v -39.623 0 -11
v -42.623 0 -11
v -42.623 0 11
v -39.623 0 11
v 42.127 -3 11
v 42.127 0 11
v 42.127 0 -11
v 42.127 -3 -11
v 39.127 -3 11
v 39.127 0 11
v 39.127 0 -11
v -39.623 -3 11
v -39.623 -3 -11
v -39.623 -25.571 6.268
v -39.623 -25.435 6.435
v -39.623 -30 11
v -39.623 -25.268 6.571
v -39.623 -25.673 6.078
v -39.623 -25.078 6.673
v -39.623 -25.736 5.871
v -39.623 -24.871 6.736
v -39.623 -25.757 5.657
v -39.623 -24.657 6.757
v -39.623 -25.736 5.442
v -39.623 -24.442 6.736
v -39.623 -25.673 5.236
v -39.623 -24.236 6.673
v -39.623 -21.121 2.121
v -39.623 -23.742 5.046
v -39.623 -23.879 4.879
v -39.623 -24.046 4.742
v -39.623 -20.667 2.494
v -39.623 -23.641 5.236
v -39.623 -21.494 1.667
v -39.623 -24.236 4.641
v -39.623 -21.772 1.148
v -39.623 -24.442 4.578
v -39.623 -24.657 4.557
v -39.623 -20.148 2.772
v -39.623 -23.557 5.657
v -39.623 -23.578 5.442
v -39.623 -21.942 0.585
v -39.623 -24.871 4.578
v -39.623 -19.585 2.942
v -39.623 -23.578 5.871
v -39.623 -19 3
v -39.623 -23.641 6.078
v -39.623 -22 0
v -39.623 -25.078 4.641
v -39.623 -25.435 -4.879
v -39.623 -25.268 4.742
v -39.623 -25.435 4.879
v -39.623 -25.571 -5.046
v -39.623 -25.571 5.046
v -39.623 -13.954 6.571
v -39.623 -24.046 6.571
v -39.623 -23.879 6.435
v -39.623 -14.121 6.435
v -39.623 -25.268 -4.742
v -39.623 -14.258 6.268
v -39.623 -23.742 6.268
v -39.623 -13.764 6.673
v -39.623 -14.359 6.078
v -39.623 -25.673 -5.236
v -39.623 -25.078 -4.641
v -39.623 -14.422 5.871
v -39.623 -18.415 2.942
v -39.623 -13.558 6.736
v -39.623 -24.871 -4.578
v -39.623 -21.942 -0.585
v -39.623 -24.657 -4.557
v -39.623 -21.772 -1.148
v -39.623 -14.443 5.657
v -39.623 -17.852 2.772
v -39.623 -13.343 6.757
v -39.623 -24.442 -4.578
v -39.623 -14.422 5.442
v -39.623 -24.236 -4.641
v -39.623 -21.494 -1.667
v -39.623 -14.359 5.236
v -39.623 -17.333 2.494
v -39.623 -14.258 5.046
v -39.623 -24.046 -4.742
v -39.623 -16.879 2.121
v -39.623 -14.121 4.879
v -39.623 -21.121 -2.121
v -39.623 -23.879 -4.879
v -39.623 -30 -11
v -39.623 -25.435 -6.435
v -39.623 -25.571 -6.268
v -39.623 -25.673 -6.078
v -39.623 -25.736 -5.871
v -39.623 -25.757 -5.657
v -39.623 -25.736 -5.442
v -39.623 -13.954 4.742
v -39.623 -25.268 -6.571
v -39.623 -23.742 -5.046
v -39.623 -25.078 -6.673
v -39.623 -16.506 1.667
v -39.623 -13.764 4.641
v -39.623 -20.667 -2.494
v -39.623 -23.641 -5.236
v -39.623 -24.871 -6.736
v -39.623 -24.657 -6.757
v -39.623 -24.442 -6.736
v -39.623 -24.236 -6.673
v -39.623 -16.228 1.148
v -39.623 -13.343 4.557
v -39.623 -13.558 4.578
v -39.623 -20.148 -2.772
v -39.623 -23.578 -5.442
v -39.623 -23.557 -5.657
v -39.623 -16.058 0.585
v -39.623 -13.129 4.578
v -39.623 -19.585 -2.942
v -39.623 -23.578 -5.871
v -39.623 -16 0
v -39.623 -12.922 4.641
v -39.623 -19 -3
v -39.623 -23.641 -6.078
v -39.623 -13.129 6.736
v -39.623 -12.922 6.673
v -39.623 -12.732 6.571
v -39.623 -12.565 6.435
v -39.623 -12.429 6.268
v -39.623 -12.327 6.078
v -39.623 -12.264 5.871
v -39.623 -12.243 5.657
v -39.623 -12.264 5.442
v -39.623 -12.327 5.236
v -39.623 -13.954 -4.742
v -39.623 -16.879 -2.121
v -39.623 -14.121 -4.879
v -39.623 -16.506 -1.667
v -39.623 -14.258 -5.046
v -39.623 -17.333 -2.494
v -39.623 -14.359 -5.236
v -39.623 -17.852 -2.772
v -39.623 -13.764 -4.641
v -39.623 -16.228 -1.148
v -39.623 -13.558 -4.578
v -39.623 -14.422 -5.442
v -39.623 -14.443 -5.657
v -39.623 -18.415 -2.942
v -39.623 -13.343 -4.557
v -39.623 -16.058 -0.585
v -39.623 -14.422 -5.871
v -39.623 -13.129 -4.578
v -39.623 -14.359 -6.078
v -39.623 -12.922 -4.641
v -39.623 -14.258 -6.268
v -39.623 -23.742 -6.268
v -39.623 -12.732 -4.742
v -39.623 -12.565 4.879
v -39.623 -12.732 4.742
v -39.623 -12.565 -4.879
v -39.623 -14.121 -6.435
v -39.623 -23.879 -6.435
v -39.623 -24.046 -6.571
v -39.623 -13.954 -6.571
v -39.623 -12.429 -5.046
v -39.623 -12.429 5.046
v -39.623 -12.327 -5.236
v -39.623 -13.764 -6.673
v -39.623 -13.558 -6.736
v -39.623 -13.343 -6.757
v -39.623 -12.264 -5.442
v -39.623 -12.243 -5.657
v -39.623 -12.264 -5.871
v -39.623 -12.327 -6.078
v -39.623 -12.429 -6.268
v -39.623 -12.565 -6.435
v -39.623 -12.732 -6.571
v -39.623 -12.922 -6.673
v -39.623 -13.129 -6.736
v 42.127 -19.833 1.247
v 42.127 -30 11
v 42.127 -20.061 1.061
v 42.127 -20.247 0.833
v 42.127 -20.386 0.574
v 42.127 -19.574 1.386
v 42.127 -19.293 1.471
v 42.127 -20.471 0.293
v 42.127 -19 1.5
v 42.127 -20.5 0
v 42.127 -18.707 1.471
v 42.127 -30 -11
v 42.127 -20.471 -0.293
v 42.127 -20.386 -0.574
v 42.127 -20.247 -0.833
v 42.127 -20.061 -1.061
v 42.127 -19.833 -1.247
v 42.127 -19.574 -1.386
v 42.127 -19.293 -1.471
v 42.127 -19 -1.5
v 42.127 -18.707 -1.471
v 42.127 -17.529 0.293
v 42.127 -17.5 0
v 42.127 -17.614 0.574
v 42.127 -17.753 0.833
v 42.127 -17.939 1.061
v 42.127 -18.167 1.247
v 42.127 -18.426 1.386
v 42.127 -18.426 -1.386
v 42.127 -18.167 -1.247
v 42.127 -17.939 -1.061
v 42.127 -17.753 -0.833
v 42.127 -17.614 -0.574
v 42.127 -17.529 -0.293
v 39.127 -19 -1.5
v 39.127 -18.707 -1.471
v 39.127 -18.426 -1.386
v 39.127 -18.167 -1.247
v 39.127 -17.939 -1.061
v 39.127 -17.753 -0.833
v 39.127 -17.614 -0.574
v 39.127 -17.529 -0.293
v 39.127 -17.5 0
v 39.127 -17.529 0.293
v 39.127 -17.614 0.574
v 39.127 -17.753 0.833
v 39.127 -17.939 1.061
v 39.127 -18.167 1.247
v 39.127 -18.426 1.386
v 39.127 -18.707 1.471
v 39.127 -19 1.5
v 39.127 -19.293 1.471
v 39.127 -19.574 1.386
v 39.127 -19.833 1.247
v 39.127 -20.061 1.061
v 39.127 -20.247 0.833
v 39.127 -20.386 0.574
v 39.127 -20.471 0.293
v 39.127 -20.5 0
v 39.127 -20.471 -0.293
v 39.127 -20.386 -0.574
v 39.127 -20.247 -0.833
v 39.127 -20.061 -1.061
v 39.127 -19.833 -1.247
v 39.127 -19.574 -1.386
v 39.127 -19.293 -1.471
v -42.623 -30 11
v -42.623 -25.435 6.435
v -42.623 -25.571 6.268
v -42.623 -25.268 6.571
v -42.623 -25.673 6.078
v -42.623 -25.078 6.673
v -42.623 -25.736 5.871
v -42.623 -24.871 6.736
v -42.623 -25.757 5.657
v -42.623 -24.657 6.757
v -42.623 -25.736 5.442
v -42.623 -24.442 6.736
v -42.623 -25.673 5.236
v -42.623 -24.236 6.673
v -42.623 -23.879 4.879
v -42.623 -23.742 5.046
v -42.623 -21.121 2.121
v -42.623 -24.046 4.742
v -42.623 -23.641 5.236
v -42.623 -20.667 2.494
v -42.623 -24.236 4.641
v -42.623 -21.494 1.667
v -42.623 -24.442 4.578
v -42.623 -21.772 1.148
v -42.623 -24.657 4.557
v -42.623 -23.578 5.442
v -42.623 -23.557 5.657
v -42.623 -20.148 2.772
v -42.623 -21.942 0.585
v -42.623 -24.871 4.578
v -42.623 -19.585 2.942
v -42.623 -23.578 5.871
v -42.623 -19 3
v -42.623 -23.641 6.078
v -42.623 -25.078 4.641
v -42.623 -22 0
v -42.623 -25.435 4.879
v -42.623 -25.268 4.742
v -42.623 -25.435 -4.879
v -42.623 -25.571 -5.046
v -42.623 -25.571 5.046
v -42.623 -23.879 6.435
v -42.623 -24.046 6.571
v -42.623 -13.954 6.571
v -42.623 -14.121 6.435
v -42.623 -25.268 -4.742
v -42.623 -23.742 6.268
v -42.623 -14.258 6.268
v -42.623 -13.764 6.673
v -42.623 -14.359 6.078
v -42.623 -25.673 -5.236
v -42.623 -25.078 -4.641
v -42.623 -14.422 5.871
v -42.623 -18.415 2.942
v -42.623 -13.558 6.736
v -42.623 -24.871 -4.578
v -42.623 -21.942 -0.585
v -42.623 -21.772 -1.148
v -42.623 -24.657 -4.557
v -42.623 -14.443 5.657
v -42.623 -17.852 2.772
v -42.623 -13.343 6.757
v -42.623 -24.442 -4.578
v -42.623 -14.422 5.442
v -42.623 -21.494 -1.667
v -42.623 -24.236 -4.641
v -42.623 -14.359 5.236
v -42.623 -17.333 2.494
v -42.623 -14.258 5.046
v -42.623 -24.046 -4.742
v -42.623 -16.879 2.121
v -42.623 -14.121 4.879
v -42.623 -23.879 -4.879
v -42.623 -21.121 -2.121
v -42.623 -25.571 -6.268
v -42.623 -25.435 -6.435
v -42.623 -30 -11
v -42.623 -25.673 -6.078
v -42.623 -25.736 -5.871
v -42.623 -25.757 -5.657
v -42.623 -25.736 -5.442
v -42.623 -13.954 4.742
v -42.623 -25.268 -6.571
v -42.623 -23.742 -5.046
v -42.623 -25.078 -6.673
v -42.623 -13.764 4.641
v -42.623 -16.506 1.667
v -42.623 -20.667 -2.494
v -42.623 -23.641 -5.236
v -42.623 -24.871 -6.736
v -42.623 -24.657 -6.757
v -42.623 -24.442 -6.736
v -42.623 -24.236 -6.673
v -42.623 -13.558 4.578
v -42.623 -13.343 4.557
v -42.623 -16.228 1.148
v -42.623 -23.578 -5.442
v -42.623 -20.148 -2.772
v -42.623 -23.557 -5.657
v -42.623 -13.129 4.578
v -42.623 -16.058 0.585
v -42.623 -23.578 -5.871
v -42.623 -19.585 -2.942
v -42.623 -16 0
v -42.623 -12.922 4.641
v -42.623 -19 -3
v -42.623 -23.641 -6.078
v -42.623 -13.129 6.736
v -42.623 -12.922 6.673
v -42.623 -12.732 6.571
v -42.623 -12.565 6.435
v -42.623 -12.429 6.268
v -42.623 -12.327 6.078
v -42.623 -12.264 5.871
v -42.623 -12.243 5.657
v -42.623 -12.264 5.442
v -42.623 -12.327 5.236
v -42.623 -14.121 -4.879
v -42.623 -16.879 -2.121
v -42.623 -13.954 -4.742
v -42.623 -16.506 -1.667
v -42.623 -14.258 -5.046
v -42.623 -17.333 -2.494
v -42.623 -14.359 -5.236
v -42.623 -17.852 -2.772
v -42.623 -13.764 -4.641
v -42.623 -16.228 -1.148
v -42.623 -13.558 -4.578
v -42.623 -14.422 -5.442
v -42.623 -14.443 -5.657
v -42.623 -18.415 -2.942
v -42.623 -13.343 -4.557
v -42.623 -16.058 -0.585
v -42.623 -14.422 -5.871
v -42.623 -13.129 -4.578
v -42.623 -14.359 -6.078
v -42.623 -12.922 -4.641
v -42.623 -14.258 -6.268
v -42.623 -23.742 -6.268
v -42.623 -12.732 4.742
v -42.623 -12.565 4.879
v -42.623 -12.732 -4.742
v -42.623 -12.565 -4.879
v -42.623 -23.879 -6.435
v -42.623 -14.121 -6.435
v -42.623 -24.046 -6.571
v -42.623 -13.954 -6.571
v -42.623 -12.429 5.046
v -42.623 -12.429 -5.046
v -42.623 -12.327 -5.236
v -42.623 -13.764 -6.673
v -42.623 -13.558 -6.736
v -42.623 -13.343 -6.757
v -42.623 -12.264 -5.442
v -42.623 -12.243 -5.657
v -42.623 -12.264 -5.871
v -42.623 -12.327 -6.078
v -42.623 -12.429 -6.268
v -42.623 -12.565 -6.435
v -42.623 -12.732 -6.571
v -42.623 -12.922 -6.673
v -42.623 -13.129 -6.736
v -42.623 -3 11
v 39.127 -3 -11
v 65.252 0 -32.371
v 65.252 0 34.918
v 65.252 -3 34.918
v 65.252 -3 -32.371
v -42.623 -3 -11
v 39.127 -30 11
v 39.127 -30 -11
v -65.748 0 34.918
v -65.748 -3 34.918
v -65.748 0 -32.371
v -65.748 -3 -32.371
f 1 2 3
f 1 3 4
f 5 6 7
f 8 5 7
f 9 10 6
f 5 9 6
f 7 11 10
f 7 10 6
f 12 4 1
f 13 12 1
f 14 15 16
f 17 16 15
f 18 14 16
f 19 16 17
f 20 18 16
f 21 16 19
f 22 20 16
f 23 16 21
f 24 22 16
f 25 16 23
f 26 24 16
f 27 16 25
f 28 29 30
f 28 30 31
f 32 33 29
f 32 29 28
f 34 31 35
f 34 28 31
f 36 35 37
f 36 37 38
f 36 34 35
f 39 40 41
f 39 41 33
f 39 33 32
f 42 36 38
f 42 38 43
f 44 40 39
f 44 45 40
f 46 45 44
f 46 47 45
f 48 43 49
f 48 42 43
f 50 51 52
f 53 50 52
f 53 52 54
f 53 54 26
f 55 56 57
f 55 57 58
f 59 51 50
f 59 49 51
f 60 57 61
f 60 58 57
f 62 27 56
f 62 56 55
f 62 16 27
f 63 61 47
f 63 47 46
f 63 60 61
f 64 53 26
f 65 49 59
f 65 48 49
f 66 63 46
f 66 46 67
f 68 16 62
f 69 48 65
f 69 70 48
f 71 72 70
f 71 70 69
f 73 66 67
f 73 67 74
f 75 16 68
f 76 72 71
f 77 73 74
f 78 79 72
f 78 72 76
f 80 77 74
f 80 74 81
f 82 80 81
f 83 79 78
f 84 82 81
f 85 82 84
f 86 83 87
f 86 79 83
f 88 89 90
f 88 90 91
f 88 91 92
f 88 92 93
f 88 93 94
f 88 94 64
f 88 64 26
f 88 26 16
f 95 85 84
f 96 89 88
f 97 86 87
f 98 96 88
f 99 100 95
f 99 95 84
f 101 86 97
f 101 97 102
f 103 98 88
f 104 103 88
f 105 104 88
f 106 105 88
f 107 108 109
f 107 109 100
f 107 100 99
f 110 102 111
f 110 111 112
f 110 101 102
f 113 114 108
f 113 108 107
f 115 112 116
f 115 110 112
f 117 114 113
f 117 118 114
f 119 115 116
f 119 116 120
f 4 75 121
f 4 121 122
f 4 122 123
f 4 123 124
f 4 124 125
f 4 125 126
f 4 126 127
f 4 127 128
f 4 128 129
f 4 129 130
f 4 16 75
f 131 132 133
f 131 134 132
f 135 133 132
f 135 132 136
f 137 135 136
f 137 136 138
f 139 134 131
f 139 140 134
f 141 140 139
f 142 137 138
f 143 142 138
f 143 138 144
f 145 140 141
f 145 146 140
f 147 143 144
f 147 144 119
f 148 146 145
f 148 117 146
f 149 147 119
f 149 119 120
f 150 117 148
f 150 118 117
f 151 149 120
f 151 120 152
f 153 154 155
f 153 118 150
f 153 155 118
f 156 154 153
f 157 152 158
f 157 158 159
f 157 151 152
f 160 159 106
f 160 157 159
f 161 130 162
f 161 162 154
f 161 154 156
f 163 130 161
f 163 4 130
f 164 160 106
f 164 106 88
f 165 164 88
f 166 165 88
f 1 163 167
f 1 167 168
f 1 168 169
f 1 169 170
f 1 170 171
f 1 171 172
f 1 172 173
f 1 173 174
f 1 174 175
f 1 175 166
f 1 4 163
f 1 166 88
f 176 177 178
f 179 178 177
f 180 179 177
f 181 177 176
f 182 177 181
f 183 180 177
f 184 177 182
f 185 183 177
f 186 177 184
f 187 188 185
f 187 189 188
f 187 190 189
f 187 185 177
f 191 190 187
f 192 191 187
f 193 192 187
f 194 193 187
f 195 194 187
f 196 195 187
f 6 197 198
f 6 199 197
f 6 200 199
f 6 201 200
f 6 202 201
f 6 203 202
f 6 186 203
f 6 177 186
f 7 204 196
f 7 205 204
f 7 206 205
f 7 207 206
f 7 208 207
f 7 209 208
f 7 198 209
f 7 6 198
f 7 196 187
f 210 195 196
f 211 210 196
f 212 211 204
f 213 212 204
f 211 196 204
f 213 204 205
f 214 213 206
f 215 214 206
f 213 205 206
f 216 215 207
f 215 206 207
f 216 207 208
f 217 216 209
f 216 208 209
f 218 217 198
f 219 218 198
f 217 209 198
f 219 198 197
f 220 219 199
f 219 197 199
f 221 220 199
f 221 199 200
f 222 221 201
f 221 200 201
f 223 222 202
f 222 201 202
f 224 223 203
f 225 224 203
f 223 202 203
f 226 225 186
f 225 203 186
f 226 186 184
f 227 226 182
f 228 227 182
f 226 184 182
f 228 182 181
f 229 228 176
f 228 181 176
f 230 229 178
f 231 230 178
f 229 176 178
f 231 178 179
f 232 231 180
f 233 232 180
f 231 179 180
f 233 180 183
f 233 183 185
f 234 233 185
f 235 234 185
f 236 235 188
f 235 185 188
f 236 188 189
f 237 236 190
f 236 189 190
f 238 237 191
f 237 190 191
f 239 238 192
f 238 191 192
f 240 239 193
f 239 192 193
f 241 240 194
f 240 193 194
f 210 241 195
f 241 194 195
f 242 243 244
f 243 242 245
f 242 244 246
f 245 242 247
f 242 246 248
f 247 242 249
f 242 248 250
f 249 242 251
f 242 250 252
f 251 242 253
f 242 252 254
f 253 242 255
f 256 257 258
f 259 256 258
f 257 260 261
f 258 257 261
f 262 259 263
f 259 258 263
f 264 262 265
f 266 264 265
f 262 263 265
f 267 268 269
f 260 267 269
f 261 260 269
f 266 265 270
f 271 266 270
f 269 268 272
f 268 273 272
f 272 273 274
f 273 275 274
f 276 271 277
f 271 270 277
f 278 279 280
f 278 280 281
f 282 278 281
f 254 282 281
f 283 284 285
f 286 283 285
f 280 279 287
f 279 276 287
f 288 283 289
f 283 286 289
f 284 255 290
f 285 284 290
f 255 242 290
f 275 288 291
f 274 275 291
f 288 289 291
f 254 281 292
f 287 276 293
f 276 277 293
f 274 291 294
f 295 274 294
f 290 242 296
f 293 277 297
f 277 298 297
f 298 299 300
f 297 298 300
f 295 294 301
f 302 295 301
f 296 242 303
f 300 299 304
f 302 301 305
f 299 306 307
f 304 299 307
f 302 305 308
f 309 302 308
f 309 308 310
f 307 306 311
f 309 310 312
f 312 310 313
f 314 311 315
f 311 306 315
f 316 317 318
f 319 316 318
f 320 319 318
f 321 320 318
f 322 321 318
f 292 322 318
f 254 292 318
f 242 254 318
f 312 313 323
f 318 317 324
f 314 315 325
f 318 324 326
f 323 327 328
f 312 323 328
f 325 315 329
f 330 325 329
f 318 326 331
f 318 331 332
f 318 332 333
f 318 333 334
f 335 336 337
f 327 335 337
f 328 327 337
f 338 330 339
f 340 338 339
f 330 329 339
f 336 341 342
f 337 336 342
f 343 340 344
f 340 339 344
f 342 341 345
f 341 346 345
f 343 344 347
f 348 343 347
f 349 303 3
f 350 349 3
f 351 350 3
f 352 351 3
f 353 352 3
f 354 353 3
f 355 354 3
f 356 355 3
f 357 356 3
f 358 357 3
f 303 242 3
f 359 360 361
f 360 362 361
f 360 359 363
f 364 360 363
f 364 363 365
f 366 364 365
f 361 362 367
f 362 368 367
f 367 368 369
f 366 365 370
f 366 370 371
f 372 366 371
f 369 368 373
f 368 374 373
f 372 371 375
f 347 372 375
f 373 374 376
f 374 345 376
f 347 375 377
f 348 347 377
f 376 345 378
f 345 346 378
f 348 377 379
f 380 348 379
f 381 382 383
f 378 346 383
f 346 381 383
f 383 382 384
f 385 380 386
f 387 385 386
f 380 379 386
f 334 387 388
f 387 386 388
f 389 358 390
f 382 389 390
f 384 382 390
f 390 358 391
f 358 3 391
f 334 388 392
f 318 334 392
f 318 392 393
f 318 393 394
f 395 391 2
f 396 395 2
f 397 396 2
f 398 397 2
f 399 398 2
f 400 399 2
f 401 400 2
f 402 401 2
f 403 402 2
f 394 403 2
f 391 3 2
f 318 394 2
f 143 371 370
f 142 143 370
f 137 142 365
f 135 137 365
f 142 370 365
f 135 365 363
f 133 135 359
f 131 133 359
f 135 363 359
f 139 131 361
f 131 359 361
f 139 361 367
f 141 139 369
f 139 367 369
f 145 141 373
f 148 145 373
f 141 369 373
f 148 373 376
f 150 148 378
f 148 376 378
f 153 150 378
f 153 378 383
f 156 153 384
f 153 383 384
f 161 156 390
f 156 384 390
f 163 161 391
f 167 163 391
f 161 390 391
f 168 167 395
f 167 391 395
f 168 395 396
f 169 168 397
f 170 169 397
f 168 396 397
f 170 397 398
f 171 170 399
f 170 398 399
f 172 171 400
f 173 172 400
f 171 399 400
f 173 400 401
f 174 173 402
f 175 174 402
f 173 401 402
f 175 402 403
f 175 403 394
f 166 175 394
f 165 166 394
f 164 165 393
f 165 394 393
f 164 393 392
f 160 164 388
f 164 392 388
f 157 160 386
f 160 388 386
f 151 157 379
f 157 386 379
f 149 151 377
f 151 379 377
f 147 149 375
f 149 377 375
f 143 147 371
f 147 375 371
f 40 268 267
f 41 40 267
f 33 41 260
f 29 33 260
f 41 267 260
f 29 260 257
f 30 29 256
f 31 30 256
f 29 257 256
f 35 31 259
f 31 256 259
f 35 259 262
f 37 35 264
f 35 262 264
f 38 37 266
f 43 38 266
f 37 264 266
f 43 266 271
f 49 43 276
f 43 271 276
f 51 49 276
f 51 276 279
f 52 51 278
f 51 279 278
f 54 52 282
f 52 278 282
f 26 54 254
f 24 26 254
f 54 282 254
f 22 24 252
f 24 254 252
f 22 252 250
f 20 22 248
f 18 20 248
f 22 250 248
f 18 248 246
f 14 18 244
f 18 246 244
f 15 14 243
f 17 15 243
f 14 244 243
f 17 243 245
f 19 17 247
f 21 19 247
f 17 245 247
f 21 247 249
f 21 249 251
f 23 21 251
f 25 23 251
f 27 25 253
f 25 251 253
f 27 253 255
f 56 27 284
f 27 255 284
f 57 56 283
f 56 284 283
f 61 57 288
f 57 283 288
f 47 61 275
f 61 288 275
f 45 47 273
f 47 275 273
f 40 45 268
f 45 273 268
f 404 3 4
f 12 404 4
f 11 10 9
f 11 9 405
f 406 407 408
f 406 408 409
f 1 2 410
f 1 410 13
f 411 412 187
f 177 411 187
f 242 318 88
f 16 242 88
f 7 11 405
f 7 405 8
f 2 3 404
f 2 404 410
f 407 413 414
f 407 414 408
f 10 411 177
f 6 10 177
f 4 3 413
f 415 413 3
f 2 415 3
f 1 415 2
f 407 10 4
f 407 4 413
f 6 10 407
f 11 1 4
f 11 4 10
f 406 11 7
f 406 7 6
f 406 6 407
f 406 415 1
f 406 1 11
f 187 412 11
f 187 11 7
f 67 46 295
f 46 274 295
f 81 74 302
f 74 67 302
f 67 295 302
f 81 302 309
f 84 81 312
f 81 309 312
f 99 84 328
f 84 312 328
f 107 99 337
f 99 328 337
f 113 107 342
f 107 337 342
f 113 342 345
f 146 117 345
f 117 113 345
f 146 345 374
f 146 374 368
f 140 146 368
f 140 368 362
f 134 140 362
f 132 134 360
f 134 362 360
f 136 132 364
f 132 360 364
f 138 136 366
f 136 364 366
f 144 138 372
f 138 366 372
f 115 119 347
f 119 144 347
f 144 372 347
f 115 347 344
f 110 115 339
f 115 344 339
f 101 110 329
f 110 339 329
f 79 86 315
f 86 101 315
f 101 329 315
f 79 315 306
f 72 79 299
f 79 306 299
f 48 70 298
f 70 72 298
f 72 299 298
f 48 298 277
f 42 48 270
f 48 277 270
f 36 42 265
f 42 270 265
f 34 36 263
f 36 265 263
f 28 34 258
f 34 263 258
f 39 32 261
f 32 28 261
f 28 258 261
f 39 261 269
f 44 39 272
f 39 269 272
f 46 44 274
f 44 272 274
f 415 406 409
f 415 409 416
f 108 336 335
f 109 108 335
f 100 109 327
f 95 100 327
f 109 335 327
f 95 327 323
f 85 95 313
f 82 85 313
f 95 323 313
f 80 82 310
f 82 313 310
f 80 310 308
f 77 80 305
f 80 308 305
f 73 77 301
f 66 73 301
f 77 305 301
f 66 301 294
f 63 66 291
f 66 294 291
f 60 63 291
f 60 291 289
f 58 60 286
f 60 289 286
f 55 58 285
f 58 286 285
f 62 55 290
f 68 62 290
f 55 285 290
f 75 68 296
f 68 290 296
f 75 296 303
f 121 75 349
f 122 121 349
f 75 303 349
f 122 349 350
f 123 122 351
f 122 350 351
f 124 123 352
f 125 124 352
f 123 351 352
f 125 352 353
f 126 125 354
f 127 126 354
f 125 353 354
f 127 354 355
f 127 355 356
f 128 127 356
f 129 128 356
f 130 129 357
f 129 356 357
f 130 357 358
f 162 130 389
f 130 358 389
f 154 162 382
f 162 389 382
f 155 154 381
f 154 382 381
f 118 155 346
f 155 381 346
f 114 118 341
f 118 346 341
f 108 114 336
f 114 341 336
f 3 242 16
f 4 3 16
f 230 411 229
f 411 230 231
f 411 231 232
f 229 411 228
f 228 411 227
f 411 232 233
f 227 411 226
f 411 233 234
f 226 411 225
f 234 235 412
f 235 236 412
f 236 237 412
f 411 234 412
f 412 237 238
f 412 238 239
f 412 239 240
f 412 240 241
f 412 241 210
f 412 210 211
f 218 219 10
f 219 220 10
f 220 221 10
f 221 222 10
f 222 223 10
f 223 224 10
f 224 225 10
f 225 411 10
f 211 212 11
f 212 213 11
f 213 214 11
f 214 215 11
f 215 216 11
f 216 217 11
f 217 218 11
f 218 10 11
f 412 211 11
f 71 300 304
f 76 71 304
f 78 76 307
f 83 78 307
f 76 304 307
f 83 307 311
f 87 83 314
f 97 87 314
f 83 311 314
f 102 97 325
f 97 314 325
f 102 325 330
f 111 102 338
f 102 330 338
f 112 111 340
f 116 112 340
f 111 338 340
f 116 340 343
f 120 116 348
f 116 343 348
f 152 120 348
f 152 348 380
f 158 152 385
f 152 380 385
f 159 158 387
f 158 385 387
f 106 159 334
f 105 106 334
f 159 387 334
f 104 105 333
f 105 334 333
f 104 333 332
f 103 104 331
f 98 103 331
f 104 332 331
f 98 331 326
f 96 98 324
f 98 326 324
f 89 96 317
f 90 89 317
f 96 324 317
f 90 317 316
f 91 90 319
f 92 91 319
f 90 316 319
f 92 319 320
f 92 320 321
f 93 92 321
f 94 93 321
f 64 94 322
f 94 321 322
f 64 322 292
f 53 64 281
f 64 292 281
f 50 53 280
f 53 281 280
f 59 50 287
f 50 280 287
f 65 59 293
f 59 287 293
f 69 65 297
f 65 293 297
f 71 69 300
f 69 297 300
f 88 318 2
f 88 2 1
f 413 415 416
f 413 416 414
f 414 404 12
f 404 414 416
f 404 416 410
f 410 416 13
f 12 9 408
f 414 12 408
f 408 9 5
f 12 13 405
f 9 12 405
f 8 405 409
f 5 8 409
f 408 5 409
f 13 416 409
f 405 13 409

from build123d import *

# Parameters (mm, degrees)
SKETCH1_W             = 3
SKETCH1_H             = 22
BOSS_EXTRUDE1_DEPTH   = 3
SKETCH1_3_W           = 3
SKETCH1_3_H           = 22
BOSS_EXTRUDE2_DEPTH   = 30
BOSS_EXTRUDE2_2_DEPTH = 30
SKETCH2_R             = 3
SKETCH2_R_2           = 1.1
CUT_EXTRUDE1_DEPTH    = 3
SKETCH3_R             = 1.5
CUT_EXTRUDE2_DEPTH    = 3
CIRPATTERN1_COUNT     = 4


with BuildPart() as part:
    # Sketch1 → Boss-Extrude1 (new body)
    with BuildSketch(Plane(origin=(0, 0, 0), x_dir=(1, 0, 0), z_dir=(0, 1, 0))):
        Polygon((-65.748381877, 32.370550162), (-65.748381877, 19.870550162), (-65.748381877, -22.417679095), (-65.748381877, -34.917679095), (65.251618123, -34.917679095), (65.251618123, -22.417679095), (65.251618123, 17.582320905), (65.251618123, 32.370550162), align=None)
        with Locations((-41.123381877, 0)):
            Rectangle(SKETCH1_W, SKETCH1_H, mode=Mode.SUBTRACT)
        with Locations((40.626618123, 0)):
            Rectangle(SKETCH1_W, SKETCH1_H, mode=Mode.SUBTRACT)
    extrude(amount=-BOSS_EXTRUDE1_DEPTH)


with BuildPart() as body_2:
    # Sketch1<3> → Boss-Extrude2 (new body)
    with BuildSketch(Plane(origin=(0, 0, 0), x_dir=(1, 0, 0), z_dir=(0, 1, 0))):
        with Locations((-41.123381877, 0)):
            Rectangle(SKETCH1_3_W, SKETCH1_3_H)
    extrude(amount=-BOSS_EXTRUDE2_DEPTH)

    # Sketch2 → Cut-Extrude1 (cut)
    with BuildSketch(Plane.ZY.offset(42.623381877)):
        with Locations((0, -19)):
            Circle(SKETCH2_R)
        with Locations((-5.656854249, -24.656854249)):
            Circle(SKETCH2_R_2)
    cut_extrude1 = extrude(amount=-CUT_EXTRUDE1_DEPTH, mode=Mode.SUBTRACT)

    # CirPattern1: Cut-Extrude1 ×4 about axis
    cirpattern1_axis = Axis((0, -19, 0), (1, 0, 0))
    for i in range(1, CIRPATTERN1_COUNT):
        add(cut_extrude1.rotate(cirpattern1_axis, i * 360 / CIRPATTERN1_COUNT), mode=Mode.SUBTRACT)


with BuildPart() as body_3:
    # Sketch1<3> → Boss-Extrude2 2 (new body)
    with BuildSketch(Plane(origin=(0, 0, 0), x_dir=(1, 0, 0), z_dir=(0, 1, 0))):
        with Locations((40.626618123, 0)):
            Rectangle(SKETCH1_3_W, SKETCH1_3_H)
    extrude(amount=-BOSS_EXTRUDE2_2_DEPTH)

    # Sketch3 → Cut-Extrude2 (cut)
    with BuildSketch(Plane(origin=(42.126618123, 0, 0), x_dir=(0, 0, -1), z_dir=(1, 0, 0))):
        with Locations((0, -19)):
            Circle(SKETCH3_R)
    extrude(amount=-CUT_EXTRUDE2_DEPTH, mode=Mode.SUBTRACT)


solid = Compound([part.part, body_2.part, body_3.part])
